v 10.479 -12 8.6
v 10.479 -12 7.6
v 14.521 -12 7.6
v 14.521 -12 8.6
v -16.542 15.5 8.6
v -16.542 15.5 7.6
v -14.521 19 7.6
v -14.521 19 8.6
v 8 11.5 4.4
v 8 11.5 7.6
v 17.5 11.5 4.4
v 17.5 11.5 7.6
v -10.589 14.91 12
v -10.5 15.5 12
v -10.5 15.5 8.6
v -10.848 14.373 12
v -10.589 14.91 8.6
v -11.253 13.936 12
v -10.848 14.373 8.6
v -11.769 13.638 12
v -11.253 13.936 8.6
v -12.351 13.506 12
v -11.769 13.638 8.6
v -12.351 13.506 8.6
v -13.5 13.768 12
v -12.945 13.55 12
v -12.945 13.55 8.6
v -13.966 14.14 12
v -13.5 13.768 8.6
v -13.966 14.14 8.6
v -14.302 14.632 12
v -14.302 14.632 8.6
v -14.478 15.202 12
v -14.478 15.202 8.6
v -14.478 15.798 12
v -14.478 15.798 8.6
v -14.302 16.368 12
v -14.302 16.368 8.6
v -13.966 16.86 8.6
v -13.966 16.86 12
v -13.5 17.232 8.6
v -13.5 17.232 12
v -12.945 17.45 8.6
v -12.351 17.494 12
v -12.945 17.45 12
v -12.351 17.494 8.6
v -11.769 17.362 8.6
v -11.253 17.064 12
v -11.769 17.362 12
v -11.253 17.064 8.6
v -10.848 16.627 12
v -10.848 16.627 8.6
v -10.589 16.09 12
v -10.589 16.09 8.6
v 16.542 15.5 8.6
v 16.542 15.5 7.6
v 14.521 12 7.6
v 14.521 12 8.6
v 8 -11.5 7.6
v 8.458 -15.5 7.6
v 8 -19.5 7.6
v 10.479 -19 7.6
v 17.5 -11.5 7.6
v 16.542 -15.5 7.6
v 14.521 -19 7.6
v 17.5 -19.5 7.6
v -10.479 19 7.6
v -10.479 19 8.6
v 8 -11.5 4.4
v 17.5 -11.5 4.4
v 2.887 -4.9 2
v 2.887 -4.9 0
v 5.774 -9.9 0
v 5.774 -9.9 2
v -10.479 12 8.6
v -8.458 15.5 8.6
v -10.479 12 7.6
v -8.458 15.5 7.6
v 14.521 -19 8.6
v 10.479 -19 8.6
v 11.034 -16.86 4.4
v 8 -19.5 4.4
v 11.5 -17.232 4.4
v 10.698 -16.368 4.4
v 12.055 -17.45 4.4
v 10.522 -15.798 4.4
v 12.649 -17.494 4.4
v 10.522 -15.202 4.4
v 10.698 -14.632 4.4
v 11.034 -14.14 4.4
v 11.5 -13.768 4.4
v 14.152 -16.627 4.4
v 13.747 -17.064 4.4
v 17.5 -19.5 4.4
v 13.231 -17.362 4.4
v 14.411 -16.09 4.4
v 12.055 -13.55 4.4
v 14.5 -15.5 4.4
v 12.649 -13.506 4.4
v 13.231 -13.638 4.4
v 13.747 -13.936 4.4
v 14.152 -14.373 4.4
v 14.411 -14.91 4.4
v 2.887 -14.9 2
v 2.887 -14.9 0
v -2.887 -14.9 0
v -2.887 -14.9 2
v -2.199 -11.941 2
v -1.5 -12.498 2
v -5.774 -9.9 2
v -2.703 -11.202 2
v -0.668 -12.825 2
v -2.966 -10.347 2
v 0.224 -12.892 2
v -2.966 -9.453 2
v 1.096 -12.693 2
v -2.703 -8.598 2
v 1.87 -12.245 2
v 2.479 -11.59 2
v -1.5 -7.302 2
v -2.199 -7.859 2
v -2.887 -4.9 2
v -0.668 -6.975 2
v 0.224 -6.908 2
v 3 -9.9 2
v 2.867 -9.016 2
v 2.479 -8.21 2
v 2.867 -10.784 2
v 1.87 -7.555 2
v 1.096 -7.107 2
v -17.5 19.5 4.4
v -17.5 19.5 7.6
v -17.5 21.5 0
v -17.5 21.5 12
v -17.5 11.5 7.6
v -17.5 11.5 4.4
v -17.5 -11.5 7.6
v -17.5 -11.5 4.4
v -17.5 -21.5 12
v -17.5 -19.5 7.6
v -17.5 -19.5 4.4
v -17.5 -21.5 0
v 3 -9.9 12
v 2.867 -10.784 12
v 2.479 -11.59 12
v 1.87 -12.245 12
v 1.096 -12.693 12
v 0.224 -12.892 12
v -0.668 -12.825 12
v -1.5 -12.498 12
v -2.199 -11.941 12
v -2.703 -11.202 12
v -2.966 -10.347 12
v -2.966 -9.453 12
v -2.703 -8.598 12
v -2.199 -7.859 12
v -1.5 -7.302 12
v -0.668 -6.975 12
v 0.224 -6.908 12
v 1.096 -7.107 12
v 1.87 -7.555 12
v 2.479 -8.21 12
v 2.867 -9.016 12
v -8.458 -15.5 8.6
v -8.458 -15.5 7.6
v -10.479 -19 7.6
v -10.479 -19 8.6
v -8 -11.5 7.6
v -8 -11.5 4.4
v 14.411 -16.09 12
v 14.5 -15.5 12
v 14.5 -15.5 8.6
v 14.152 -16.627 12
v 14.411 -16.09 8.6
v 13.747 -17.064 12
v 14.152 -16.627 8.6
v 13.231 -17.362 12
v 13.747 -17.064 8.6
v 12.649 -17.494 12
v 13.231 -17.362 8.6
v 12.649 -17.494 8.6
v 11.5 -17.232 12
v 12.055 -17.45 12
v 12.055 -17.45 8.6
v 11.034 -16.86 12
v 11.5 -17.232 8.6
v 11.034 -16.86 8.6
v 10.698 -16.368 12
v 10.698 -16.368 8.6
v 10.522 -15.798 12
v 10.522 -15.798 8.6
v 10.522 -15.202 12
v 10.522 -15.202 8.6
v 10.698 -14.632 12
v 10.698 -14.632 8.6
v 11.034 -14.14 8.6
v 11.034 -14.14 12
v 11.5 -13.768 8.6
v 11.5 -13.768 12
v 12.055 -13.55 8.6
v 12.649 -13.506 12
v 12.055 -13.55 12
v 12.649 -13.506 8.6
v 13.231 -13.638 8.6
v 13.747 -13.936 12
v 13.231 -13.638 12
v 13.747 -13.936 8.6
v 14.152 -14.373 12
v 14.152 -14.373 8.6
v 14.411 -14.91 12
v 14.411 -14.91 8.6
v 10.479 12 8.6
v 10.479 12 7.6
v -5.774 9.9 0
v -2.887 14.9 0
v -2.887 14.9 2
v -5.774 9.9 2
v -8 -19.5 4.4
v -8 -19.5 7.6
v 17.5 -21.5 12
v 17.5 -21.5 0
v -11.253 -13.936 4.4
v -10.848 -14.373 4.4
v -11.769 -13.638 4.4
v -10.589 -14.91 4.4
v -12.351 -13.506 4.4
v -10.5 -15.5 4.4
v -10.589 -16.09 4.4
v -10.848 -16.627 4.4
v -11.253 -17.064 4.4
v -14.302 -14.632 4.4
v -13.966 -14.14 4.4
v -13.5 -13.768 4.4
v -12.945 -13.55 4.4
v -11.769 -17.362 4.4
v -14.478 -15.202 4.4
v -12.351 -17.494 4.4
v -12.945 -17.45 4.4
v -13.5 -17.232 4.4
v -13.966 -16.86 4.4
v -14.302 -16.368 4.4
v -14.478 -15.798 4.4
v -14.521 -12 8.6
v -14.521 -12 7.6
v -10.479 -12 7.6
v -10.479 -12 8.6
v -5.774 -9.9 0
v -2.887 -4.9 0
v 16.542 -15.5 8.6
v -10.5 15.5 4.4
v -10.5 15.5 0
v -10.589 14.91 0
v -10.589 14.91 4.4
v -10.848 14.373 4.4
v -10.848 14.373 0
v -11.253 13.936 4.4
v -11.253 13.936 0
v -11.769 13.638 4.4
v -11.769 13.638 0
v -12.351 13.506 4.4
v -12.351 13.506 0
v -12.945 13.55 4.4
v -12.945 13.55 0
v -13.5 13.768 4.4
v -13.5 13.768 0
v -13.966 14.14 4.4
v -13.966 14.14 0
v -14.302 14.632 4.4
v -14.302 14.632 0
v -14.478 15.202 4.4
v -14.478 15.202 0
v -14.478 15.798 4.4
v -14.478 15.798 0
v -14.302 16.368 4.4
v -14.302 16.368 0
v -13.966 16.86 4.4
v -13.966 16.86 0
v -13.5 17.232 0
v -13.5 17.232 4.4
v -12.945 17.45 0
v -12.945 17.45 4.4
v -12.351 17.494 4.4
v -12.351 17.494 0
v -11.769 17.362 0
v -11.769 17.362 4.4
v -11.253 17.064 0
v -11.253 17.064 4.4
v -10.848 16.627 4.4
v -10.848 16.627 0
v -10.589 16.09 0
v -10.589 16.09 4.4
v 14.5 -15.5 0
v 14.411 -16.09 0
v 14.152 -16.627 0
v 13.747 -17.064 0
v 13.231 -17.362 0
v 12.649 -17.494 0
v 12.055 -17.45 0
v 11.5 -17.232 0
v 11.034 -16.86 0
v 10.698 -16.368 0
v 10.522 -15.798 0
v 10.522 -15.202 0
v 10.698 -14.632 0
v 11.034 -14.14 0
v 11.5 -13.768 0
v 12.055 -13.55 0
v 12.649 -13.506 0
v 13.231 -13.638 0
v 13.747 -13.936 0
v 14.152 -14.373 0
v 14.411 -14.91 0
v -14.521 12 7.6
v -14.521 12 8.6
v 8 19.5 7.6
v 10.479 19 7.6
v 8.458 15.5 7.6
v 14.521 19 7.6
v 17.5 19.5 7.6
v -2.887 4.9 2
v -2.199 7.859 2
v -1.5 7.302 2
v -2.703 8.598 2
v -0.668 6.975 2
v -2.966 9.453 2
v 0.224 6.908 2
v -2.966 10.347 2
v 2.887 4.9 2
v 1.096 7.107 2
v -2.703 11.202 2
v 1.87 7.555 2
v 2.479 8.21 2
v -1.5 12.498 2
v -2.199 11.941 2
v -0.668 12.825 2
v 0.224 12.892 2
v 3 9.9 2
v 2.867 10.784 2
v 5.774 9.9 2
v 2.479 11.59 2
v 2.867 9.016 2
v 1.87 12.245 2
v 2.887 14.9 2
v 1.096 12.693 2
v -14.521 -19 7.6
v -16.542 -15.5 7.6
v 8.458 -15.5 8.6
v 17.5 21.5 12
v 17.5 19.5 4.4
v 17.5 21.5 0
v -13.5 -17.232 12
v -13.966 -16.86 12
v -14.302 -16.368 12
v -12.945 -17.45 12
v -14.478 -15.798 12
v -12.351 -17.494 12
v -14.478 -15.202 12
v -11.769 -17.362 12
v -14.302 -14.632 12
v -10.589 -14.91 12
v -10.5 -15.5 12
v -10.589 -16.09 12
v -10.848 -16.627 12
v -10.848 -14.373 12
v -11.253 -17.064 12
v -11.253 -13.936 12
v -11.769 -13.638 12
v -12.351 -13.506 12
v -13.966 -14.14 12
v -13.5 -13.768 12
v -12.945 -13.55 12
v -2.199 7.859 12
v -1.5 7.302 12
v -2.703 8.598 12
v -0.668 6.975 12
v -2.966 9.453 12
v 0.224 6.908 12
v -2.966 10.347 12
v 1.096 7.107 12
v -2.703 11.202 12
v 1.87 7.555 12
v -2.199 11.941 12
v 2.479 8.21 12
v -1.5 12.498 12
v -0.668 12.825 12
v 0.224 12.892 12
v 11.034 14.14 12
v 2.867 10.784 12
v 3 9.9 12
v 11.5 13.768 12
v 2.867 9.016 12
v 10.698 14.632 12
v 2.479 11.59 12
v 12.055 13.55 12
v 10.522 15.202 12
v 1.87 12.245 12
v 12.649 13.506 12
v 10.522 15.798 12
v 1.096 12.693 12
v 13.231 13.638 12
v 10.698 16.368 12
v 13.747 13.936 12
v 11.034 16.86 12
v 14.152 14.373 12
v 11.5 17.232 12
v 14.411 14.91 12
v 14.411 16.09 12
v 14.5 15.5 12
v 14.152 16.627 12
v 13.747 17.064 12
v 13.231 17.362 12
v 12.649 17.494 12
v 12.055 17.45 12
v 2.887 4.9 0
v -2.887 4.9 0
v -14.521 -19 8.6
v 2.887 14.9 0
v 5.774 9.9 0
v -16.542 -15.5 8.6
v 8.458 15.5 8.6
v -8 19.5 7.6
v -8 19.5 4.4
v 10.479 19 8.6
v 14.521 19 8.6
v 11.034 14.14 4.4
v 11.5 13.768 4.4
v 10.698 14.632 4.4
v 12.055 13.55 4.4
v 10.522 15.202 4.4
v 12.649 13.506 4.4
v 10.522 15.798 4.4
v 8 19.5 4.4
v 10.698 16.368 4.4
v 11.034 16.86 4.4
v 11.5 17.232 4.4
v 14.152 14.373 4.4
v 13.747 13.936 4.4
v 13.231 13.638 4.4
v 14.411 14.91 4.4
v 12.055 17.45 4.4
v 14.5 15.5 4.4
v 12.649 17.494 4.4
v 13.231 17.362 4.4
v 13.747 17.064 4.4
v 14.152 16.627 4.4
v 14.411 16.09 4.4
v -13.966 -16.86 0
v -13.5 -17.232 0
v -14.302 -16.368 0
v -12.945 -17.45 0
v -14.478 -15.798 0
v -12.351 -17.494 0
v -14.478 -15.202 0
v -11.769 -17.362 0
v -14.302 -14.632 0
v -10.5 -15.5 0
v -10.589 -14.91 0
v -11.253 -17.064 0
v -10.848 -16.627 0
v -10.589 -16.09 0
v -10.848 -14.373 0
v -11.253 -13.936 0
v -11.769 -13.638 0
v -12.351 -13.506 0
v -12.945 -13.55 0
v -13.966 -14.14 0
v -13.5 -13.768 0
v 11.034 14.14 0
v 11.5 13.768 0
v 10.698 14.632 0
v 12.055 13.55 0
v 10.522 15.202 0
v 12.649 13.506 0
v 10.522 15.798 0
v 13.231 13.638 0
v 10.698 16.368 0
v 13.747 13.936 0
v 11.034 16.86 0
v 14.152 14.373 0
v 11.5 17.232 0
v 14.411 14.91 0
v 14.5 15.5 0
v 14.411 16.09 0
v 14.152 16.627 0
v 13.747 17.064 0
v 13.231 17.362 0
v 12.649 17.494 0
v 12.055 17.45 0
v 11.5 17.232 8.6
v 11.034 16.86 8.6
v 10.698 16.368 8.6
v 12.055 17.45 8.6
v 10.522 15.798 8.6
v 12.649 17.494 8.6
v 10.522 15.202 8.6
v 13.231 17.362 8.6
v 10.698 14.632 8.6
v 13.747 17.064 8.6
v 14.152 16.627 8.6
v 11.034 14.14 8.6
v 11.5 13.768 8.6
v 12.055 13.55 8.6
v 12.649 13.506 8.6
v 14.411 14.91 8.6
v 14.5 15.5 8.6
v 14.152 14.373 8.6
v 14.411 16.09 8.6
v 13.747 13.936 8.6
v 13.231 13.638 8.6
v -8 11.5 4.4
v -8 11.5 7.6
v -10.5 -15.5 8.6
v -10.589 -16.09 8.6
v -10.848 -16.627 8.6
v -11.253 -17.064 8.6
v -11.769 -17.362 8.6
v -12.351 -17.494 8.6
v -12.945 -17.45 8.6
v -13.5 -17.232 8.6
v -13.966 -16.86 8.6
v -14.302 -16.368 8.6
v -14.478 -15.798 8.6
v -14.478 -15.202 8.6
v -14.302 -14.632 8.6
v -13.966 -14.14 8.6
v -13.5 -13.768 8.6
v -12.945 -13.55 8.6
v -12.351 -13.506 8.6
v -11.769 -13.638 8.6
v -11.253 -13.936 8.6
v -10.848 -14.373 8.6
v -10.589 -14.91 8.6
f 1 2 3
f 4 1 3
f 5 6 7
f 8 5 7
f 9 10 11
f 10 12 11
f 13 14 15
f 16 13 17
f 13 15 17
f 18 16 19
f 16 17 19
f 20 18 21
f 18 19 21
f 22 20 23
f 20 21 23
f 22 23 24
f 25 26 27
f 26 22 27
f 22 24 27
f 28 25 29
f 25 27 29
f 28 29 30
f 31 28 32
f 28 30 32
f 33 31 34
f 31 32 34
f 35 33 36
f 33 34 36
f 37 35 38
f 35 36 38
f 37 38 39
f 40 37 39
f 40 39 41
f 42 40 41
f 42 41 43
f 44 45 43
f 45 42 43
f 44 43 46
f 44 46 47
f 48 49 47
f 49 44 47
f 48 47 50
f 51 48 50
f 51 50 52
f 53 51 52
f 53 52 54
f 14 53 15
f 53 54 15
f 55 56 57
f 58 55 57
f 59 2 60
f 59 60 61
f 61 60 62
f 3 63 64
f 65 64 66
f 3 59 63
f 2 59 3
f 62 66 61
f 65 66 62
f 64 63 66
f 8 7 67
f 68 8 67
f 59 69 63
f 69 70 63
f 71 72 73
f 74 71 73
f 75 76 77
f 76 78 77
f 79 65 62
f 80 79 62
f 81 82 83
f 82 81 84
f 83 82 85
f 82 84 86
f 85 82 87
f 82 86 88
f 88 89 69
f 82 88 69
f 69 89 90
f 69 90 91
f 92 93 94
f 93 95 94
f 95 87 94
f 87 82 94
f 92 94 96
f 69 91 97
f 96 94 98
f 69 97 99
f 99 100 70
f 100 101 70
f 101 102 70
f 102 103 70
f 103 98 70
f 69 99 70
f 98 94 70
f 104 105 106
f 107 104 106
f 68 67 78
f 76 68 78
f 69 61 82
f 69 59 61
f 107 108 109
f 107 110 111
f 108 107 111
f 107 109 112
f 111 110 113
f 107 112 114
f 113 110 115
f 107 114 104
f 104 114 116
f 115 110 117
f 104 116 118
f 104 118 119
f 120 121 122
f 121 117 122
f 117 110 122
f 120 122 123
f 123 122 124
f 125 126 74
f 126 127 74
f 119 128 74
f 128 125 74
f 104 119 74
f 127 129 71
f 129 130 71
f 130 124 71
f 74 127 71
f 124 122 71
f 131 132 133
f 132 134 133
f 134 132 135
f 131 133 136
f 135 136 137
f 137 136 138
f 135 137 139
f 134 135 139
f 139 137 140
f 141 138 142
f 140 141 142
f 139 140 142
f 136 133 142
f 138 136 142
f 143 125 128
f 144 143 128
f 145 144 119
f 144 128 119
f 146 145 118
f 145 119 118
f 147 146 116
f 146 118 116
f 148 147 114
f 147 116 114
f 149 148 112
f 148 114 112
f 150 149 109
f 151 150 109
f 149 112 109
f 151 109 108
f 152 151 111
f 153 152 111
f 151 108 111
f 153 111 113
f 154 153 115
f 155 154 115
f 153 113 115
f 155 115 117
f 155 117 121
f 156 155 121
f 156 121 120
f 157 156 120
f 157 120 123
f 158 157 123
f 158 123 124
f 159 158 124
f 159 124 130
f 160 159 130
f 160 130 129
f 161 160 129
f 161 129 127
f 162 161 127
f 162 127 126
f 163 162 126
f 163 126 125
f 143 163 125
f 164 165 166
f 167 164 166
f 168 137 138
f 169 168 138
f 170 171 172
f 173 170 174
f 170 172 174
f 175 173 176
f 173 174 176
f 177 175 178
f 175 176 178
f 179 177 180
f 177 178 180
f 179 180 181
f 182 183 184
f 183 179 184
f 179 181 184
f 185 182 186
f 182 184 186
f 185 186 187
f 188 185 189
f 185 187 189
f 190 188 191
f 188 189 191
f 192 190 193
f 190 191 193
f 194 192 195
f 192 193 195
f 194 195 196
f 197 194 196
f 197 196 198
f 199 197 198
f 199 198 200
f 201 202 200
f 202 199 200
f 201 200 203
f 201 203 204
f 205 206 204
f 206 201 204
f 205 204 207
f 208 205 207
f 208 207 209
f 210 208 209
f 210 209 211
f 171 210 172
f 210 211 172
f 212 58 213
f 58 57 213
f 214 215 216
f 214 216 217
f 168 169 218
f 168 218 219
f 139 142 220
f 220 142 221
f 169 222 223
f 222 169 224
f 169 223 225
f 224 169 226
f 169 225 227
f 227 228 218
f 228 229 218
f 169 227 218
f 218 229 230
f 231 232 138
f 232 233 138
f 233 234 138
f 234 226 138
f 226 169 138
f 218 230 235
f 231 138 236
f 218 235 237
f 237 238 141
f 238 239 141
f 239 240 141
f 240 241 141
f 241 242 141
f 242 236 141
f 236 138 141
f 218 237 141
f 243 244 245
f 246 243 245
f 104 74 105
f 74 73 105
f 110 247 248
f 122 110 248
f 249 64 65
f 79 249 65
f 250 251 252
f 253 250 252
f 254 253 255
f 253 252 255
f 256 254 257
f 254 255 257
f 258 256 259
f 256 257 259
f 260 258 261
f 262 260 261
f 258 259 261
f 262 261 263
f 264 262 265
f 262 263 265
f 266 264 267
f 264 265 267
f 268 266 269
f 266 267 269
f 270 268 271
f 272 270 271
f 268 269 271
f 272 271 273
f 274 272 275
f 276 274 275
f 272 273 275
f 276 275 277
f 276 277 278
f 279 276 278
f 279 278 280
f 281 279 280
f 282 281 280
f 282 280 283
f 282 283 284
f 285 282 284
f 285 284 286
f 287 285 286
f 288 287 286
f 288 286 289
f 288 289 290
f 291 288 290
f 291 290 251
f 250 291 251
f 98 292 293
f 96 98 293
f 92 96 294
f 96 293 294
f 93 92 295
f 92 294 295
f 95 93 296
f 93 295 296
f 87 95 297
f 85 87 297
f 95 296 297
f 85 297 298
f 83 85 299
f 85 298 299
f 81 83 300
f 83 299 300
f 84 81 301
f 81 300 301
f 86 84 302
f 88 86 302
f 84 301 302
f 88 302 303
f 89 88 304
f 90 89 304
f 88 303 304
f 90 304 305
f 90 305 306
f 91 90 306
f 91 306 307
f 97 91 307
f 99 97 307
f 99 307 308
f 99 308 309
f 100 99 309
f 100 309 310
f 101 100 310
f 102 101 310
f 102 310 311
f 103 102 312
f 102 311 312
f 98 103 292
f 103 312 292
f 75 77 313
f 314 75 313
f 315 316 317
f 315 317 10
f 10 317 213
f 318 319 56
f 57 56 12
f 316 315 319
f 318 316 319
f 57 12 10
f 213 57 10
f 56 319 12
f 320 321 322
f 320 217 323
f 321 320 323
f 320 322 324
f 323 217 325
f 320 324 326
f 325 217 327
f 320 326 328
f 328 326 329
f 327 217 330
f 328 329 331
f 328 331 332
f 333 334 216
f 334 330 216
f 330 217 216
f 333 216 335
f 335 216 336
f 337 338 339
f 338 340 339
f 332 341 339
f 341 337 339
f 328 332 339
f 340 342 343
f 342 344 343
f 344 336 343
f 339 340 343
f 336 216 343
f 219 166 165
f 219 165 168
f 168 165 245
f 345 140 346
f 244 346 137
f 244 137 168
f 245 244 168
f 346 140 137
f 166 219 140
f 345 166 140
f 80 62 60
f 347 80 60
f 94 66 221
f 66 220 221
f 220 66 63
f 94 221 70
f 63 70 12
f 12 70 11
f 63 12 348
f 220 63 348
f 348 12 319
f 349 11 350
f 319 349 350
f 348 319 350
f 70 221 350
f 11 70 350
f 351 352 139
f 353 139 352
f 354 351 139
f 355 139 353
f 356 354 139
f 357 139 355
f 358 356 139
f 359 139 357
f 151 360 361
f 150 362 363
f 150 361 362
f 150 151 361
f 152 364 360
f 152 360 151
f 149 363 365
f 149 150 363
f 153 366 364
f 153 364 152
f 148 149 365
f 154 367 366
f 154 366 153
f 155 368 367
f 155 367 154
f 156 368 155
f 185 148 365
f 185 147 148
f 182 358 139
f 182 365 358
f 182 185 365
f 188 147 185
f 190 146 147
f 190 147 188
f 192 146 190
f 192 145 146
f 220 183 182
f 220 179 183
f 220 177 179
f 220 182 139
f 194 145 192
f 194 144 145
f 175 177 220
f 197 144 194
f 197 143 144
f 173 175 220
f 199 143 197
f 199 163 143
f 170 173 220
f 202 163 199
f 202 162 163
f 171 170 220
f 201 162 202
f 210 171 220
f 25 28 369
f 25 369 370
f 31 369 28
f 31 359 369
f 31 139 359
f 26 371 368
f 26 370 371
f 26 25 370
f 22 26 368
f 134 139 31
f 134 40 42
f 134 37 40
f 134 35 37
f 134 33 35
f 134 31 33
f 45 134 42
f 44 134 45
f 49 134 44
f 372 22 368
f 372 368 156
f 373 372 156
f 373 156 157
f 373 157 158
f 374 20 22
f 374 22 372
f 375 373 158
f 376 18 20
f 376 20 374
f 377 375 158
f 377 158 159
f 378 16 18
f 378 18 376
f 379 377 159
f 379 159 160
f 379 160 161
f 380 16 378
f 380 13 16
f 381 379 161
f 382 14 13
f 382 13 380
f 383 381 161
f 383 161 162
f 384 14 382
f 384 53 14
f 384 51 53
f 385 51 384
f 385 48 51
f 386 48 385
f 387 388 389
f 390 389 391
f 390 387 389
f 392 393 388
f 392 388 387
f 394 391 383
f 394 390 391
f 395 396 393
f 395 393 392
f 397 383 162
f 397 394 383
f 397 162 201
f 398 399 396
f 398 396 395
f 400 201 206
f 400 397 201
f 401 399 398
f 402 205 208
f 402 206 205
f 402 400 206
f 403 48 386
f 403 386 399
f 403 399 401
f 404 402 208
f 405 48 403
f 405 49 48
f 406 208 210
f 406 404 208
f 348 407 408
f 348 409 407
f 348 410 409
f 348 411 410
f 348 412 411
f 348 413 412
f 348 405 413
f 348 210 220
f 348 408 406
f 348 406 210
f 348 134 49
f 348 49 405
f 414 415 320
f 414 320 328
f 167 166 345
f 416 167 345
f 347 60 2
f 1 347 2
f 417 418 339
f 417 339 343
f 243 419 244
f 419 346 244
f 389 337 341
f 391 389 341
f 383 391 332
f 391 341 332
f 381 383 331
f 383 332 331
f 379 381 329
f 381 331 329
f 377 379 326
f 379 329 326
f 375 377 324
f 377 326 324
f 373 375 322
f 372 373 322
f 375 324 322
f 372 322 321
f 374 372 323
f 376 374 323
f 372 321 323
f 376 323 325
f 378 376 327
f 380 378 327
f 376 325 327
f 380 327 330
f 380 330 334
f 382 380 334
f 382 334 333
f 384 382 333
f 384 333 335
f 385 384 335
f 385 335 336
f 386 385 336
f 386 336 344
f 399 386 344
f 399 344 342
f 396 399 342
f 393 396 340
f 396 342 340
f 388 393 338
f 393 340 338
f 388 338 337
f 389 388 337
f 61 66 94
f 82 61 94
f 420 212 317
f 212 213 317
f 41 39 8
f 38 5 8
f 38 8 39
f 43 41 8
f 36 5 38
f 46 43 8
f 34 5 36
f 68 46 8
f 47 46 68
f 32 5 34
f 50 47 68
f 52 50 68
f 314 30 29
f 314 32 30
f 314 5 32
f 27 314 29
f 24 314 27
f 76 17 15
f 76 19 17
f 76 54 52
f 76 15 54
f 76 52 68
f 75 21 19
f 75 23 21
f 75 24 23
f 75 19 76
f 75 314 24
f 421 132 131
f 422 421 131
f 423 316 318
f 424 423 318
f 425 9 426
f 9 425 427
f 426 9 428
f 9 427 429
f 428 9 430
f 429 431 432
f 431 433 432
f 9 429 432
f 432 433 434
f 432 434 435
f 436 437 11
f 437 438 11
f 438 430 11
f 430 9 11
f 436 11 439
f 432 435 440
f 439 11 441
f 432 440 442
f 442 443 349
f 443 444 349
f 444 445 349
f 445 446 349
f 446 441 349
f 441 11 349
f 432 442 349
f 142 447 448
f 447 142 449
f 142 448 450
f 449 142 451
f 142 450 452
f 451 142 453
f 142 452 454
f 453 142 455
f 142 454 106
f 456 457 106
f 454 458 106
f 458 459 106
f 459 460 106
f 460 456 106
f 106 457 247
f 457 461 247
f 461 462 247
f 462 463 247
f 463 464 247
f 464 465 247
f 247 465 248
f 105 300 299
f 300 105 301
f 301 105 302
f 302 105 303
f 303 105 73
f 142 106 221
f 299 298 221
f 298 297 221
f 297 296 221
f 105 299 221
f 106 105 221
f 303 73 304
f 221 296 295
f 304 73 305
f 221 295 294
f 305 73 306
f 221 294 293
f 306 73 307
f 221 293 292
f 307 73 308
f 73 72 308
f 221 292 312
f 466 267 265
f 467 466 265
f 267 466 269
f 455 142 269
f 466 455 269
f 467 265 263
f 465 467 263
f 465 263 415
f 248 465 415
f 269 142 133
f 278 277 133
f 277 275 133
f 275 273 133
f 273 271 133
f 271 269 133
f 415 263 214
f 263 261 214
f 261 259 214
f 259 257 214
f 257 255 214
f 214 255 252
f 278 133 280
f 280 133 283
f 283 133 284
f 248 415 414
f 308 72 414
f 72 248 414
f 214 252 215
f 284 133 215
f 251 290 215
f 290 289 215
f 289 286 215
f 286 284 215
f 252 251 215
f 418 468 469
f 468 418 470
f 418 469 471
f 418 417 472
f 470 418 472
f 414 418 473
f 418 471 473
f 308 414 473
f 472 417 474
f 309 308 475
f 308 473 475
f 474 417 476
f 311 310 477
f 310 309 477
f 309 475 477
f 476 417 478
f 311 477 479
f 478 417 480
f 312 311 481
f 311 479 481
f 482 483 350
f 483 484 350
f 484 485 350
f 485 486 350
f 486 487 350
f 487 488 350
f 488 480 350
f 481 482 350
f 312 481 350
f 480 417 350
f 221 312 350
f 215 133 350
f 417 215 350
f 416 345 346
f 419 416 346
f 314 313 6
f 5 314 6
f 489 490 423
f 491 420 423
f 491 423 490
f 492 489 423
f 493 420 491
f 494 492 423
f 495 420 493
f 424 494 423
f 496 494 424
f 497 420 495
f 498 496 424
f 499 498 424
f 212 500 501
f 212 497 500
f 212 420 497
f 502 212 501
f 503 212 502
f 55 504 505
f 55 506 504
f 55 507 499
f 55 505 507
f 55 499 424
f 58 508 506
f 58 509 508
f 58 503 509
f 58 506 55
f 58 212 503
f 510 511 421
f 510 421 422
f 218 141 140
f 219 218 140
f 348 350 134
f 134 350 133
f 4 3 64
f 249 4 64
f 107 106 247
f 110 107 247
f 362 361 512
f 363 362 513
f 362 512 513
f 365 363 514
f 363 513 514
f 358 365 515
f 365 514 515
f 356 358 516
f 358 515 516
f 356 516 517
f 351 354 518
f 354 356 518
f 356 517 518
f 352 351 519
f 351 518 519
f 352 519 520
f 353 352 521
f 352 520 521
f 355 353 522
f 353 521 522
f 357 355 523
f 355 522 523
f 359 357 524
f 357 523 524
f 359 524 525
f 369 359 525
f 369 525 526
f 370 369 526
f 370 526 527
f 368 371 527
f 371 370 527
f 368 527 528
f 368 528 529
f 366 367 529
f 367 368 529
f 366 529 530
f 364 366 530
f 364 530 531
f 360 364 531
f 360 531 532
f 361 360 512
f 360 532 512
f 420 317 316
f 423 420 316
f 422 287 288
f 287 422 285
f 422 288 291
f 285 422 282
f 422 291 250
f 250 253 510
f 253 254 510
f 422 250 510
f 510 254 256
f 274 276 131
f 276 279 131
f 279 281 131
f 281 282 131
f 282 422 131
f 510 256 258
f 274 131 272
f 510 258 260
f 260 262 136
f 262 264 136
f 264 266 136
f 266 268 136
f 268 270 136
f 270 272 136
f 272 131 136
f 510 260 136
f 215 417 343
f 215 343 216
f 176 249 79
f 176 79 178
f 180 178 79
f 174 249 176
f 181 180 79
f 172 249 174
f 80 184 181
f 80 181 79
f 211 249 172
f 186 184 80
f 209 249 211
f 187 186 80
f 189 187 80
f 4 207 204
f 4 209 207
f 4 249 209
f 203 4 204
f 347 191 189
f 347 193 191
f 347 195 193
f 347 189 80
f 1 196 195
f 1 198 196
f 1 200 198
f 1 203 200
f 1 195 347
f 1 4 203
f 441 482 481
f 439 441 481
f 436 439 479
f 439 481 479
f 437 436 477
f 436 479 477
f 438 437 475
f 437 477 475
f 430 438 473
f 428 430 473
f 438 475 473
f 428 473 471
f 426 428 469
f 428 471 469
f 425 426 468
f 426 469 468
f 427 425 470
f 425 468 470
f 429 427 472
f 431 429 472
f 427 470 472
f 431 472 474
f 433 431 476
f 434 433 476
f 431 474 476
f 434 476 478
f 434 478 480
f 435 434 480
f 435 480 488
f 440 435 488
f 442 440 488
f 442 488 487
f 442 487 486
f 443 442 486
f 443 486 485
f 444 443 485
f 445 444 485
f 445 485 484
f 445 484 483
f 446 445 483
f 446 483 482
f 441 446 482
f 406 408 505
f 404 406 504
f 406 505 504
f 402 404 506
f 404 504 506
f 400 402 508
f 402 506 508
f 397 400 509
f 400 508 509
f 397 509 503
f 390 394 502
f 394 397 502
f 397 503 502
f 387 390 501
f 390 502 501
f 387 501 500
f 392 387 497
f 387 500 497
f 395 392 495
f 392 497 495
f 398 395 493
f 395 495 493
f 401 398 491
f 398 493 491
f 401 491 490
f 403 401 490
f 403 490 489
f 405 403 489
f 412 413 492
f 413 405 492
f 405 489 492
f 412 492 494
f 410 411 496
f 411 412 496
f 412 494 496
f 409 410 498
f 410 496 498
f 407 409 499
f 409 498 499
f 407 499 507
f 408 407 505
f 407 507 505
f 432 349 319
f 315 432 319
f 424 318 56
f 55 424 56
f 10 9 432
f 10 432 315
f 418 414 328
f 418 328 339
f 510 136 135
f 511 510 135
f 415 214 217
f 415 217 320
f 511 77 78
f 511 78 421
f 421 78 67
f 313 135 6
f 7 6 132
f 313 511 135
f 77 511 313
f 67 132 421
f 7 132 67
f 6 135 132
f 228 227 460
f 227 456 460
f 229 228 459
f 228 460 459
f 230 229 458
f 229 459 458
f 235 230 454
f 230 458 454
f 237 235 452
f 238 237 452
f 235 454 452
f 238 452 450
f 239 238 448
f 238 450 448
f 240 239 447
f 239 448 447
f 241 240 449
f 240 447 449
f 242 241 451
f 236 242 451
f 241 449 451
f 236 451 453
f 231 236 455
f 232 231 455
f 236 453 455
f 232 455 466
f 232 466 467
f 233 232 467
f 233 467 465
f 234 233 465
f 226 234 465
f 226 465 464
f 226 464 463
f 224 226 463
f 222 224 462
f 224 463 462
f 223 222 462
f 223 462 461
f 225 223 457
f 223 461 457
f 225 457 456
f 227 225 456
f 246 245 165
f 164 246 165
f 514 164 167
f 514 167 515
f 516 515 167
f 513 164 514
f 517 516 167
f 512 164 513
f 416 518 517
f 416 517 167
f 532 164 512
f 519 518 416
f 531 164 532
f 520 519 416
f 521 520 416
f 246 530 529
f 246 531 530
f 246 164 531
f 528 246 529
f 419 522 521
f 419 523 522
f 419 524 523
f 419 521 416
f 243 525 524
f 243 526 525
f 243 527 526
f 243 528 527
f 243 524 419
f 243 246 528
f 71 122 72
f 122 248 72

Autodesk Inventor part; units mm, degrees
ref_plane "YZ Plane" through (0, 0, 0) normal (1, 0, 0) x (0, 1, 0)
ref_plane "XZ Plane" through (0, 0, 0) normal (0, 1, 0) x (-1, 0, 0)
ref_plane "XY Plane" through (0, 0, 0) normal (0, 0, 1) x (1, 0, 0)
sketch "EsboçoBase" plane through (0, 0, 0) normal (0, 0, 1) x (1, 0, 0)
  line L0 (-12.5, 16.5) -> (12.5, 16.5) construction
  line L1 (12.5, 16.5) -> (12.5, -16.5) construction
  line L2 (12.5, -16.5) -> (-12.5, -16.5) construction
  line L3 (-12.5, -16.5) -> (-12.5, 16.5) construction
  line L4 (-12.5, 16.5) -> (12.5, -16.5) construction
  line L5 (12.5, 16.5) -> (-12.5, -16.5) construction
  line L6 (0, 16.5) -> (0, -16.5) construction
  line L7 (-12.5, 12.9) -> (12.5, 12.9) construction
  circle A0 centre (0, 9.9) radius 3
  line L8 (-12.5, 0) -> (12.5, 0) construction
  circle A1 centre (0, -9.9) radius 3
  line L9 (17.5, 21.5) -> (-17.5, 21.5)
  line L10 (-17.5, 21.5) -> (-17.5, -21.5)
  line L11 (-17.5, -21.5) -> (17.5, -21.5)
  line L12 (17.5, -21.5) -> (17.5, 21.5)
  line L13 (-2.8868, -4.9) -> (2.8868, -4.9)
  line L14 (2.8868, -4.9) -> (5.7735, -9.9)
  line L15 (5.7735, -9.9) -> (2.8868, -14.9)
  line L16 (2.8868, -14.9) -> (-2.8868, -14.9)
  line L17 (-2.8868, -14.9) -> (-5.7735, -9.9)
  line L18 (-5.7735, -9.9) -> (-2.8868, -4.9)
  line L19 (-2.8868, 4.9) -> (2.8868, 4.9)
  line L20 (2.8868, 4.9) -> (5.7735, 9.9)
  line L21 (5.7735, 9.9) -> (2.8868, 14.9)
  line L22 (2.8868, 14.9) -> (-2.8868, 14.9)
  line L23 (-2.8868, 14.9) -> (-5.7735, 9.9)
  line L24 (-5.7735, 9.9) -> (-2.8868, 4.9)
  circle A2 centre (12.5, -15.5) radius 2
  circle A3 centre (12.5, 15.5) radius 2
  circle A4 centre (-12.5, -15.5) radius 2
  circle A5 centre (-12.5, 15.5) radius 2
  line L25 (-14.5207, -12) -> (-10.4793, -12)
  line L26 (-10.4793, -12) -> (-8.4585, -15.5)
  line L27 (-8.4585, -15.5) -> (-10.4793, -19)
  line L28 (-10.4793, -19) -> (-14.5207, -19)
  line L29 (-14.5207, -19) -> (-16.5415, -15.5)
  line L30 (-16.5415, -15.5) -> (-14.5207, -12)
  point P0 (0, 0)
  point P1 (0, -9.9)
  dimension "d0" = 25
  dimension "d1" = 33
  dimension "d2" = 3.6
  dimension "d3" = 6
  dimension "d4" = 5
  dimension "d22" = 10
  dimension "d29" = 4
  dimension "d30" = 6
  dimension "d31" = 5
  dimension "d38" = 7
extrude "Adaptador" add sketch "EsboçoBase" along normal blind 12 contours A0 | A1 | L12 L11 L10 L9 | L13 L14 L15 L16 L17 L18 | L24 L23 L22 L21 L20 L19 | A2 | A3 | A4 | A5 | L25 L26 L27 L28 L29 L30
extrude "Furos" cut sketch "EsboçoBase" along normal blind 15 contours A0 | A1
thread "Thread1" size "M6x1" class "6H" standard "ANSI Metric M Profile" full length
thread "Thread2" size "M6x1" class "6H" standard "ANSI Metric M Profile" full length
sketch "Sketch5" plane through (-17.5, -21.5, 0) normal (-1, 0, 0) x (0, 0, 1)
  point P0 (0, 21.5)
extrude "Extrusion5" cut sketch "EsboçoBase" along normal blind 2 contours L13 L14 L15 L16 L17 L18 | L24 L23 L22 L21 L20 L19
sketch "PorcasLaterais" plane through (-17.5, -21.5, 0) normal (-1, 0, 0) x (0, 0, 1)
  line L0 (4.4, 2) -> (7.6, 2)
  line L1 (7.6, 2) -> (7.6, 10)
  line L2 (7.6, 10) -> (4.4, 10)
  line L3 (4.4, 10) -> (4.4, 2)
  line L4 (0, 0) -> (12, 0) projected
  line L5 (0, 43) -> (0, 0) projected
  line L6 (4.4, 6) -> (7.6, 6) construction
  line L7 (6, 2) -> (6, 10) construction
  line L8 (6, 0) -> (6, 43) construction
  line L9 (0, 6) -> (12, 6) construction
  line L10 (12, 43) -> (12, 0) projected
  point P0 (0, 21.5)
  dimension "d32" = 3.2
  dimension "d33" = 8
  dimension "d37" = 6
extrude "Extrusion6" cut sketch "PorcasLaterais" against normal blind 9.5
sketch "Sketch7" plane through (-17.5, -19.5, 7.6) normal (0, 0, -1) x (-1, 0, 0)
  line L0 (-9.0415, 4) -> (-7.0207, 0.5) projected
  line L1 (-7.0207, 7.5) -> (-9.0415, 4) projected
  line L2 (-2.9793, 7.5) -> (-7.0207, 7.5) projected
  line L3 (-0.9585, 4) -> (-2.9793, 7.5) projected
  line L4 (-2.9793, 0.5) -> (-0.9585, 4) projected
  line L5 (-7.0207, 0.5) -> (-2.9793, 0.5) projected
  point P0 (-17.5, 19.5)
extrude "Extrusion7" cut sketch "Sketch7" against normal blind 1
extrude "Extrusion8" cut sketch "EsboçoBase" along normal blind 12 contours A2 | A3 | A4 | A5
mirror "Mirror1" about plane through (0, 0, 0) normal (1, 0, 0) of "Extrusion6", "Extrusion7"
mirror "Mirror2" about plane through (0, 0, 0) normal (0, 1, 0) of "Extrusion7", "Extrusion6", "Mirror1"
properties part number "LoadCellBase"
